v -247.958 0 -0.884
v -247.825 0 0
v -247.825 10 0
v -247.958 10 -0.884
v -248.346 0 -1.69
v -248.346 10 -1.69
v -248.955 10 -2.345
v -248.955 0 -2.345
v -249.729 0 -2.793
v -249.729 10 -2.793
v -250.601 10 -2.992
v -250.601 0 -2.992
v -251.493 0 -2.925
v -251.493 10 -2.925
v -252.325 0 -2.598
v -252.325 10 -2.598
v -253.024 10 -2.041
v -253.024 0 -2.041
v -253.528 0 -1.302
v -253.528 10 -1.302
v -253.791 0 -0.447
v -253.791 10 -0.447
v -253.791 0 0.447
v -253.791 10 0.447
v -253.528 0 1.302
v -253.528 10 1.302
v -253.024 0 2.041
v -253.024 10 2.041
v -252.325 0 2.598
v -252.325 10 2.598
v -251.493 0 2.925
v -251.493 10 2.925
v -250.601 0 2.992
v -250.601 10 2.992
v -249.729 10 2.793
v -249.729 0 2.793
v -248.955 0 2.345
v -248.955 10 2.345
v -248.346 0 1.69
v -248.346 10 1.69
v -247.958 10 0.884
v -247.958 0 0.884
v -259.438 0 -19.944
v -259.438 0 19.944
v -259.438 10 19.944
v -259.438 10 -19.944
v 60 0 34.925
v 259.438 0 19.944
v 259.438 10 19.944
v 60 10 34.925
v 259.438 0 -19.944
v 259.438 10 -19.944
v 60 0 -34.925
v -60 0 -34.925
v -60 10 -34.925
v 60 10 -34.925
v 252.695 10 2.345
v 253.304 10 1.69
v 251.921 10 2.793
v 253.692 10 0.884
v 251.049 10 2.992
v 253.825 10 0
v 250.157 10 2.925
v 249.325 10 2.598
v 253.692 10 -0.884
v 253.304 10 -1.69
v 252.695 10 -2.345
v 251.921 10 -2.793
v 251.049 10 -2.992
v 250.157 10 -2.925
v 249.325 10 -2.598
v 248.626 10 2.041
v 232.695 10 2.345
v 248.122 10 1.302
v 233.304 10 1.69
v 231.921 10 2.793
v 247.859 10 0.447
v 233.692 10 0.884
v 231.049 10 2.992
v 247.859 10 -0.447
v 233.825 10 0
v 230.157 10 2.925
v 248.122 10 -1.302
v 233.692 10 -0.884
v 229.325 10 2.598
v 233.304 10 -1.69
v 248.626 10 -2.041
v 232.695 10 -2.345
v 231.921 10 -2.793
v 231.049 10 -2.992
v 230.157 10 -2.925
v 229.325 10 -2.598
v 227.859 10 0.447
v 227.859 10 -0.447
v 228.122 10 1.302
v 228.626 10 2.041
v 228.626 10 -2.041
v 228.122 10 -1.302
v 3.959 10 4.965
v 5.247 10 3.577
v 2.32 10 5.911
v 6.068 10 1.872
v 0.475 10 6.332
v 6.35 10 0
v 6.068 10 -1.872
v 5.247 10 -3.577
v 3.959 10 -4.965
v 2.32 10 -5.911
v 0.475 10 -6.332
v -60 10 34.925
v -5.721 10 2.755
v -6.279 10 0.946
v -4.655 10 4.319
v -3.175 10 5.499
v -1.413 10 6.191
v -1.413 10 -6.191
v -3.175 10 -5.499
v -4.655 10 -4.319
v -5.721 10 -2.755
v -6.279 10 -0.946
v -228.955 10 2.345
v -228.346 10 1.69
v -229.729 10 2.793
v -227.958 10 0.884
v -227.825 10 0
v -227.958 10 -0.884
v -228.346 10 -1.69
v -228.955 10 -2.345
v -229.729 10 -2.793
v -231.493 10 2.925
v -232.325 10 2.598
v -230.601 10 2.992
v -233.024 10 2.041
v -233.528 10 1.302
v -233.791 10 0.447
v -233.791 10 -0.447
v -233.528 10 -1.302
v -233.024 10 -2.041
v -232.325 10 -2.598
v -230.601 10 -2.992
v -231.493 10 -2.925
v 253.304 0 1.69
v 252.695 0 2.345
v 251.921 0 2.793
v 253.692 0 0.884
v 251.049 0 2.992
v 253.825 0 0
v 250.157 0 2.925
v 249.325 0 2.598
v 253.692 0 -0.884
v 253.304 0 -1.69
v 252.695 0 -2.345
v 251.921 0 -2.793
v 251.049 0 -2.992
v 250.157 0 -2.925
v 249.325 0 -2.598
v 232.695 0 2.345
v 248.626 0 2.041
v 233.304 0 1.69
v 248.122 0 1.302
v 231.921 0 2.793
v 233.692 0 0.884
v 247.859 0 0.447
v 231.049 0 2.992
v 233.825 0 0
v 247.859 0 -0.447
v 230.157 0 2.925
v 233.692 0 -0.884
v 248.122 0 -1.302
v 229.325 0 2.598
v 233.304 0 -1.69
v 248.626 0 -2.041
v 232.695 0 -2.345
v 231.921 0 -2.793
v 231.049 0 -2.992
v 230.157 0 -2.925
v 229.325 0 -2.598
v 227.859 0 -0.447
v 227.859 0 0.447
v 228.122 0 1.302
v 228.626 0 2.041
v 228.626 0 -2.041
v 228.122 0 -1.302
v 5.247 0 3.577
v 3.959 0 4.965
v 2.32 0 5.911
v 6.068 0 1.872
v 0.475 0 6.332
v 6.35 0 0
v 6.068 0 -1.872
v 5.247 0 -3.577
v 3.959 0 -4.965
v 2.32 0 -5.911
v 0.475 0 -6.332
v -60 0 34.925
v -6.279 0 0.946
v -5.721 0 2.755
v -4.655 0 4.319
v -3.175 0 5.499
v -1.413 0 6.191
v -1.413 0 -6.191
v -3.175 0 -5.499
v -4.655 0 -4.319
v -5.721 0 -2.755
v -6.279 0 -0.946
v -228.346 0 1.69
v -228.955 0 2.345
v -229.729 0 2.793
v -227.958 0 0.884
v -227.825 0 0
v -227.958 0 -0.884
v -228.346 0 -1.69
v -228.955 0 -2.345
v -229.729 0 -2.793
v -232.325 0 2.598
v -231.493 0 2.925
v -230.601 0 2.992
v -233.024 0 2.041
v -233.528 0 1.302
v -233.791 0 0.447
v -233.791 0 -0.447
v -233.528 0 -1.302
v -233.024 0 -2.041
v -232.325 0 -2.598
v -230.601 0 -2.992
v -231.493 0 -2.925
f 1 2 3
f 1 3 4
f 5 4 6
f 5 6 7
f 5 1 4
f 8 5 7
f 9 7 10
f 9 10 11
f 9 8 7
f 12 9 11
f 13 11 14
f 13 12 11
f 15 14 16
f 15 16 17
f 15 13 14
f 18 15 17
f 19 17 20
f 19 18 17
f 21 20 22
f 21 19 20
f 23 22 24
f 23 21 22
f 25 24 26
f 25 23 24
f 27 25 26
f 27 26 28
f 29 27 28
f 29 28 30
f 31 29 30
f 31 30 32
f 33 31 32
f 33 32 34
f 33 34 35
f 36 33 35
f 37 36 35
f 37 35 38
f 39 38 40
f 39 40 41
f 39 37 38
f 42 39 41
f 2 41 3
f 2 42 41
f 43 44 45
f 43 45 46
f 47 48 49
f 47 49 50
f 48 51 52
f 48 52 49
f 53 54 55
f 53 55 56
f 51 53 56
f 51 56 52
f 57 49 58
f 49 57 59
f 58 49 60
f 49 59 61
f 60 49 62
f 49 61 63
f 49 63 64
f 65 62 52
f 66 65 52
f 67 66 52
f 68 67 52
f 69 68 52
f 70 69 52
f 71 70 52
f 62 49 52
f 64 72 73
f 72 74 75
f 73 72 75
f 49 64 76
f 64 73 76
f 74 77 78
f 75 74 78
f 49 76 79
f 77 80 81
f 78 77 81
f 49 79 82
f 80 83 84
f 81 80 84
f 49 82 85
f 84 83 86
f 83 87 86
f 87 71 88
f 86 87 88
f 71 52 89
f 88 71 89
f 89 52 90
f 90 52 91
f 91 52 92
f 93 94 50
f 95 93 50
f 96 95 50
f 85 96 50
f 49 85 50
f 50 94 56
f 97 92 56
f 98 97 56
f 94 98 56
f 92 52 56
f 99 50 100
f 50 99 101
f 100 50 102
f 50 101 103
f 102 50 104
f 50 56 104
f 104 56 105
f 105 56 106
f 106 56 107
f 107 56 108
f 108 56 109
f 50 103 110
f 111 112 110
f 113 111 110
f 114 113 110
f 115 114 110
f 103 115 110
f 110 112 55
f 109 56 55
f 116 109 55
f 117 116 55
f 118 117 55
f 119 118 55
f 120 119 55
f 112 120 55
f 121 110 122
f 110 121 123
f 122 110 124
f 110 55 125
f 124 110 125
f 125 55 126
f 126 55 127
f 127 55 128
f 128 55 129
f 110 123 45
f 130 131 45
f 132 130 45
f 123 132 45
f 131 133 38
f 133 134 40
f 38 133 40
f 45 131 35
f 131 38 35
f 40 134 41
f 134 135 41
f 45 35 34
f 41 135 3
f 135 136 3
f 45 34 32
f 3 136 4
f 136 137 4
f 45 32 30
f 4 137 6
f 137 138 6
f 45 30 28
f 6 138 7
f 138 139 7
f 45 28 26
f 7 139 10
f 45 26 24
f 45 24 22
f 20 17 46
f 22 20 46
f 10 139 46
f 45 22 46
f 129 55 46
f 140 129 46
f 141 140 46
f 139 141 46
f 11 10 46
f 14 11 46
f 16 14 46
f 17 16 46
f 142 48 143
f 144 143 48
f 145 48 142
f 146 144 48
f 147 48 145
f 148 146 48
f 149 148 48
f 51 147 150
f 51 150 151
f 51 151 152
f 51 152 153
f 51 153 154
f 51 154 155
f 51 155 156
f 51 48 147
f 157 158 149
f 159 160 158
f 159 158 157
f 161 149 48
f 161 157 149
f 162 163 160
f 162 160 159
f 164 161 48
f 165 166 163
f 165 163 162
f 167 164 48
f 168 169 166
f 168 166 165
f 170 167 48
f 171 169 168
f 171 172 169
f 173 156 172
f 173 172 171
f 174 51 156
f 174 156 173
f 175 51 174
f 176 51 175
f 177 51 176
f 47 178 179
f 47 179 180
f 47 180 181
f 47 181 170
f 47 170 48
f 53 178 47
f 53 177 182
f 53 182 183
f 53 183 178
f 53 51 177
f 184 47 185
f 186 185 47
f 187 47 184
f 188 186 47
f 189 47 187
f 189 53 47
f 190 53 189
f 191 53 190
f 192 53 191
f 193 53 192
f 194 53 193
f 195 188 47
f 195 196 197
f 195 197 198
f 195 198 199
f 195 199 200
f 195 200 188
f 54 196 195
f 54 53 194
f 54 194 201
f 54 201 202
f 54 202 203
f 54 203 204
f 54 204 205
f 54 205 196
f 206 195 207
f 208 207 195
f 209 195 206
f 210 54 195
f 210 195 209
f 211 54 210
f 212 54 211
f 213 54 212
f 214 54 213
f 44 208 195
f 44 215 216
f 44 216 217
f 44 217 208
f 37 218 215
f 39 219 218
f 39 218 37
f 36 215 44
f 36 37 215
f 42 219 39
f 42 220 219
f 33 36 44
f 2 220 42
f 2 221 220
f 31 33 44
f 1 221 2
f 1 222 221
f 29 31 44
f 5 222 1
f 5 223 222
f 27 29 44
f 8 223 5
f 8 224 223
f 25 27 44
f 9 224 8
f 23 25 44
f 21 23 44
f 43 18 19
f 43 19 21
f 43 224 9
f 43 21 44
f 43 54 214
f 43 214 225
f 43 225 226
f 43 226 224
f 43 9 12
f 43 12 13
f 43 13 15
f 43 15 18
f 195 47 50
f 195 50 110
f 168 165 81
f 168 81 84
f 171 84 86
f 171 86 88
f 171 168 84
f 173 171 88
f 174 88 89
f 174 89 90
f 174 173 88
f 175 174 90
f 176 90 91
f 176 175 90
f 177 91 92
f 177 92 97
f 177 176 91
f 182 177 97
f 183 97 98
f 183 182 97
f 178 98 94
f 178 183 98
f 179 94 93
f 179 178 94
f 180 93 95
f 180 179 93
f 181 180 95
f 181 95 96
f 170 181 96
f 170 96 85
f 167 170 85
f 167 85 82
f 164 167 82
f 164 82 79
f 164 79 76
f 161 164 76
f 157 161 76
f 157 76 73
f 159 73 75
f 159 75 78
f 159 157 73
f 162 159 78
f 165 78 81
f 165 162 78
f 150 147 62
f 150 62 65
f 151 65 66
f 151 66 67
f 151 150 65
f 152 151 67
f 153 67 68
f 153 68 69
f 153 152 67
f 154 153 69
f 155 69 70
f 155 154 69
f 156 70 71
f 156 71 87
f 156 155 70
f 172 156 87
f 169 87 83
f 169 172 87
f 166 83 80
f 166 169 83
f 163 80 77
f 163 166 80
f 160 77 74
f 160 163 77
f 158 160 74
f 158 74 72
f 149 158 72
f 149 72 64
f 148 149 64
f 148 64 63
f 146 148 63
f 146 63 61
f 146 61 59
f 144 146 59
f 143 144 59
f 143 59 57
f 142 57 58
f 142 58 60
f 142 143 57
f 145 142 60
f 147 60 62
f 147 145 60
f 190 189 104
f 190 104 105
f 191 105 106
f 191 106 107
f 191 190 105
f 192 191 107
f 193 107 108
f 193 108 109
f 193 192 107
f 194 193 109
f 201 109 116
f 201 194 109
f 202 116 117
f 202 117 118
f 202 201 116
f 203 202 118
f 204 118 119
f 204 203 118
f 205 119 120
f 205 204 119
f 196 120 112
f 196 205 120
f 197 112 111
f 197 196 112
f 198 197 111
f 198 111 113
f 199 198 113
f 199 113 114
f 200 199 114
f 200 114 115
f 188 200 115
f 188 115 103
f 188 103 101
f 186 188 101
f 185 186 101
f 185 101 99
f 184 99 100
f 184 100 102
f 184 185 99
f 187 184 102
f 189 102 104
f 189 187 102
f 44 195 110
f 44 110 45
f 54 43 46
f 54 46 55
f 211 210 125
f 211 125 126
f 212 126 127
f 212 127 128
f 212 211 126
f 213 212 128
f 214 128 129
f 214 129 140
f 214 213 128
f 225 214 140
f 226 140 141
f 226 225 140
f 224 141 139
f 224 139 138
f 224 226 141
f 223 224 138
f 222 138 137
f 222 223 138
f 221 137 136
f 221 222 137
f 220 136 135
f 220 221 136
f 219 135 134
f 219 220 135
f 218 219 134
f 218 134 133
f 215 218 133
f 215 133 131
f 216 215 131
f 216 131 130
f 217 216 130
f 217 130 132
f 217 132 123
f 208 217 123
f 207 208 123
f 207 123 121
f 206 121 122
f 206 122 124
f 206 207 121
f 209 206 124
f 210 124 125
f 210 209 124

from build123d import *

# Parameters (mm, degrees)
SKETCH1_R           = 3
SKETCH1_R_2         = 6.35
BOSS_EXTRUDE1_DEPTH = 10


with BuildPart() as part:
    # Sketch1 → Boss-Extrude1 (new body)
    with BuildSketch(Plane(origin=(0, 0, 0), x_dir=(1, 0, 0), z_dir=(0, 1, 0))):
        Polygon((-60, 34.925), (60, 34.925), (259.43812075, 19.943812075), (259.43812075, -19.943812075), (60, -34.925), (-60, -34.925), (-259.43812075, -19.943812075), (-259.43812075, 19.943812075), align=None)
        with Locations((-250.825, 0)):
            Circle(SKETCH1_R, mode=Mode.SUBTRACT)
        with Locations((250.825, 0)):
            Circle(SKETCH1_R, mode=Mode.SUBTRACT)
        Circle(SKETCH1_R_2, mode=Mode.SUBTRACT)
        with Locations((-230.825, 0)):
            Circle(SKETCH1_R, mode=Mode.SUBTRACT)
        with Locations((230.825, 0)):
            Circle(SKETCH1_R, mode=Mode.SUBTRACT)
    extrude(amount=BOSS_EXTRUDE1_DEPTH)


solid = part.part
